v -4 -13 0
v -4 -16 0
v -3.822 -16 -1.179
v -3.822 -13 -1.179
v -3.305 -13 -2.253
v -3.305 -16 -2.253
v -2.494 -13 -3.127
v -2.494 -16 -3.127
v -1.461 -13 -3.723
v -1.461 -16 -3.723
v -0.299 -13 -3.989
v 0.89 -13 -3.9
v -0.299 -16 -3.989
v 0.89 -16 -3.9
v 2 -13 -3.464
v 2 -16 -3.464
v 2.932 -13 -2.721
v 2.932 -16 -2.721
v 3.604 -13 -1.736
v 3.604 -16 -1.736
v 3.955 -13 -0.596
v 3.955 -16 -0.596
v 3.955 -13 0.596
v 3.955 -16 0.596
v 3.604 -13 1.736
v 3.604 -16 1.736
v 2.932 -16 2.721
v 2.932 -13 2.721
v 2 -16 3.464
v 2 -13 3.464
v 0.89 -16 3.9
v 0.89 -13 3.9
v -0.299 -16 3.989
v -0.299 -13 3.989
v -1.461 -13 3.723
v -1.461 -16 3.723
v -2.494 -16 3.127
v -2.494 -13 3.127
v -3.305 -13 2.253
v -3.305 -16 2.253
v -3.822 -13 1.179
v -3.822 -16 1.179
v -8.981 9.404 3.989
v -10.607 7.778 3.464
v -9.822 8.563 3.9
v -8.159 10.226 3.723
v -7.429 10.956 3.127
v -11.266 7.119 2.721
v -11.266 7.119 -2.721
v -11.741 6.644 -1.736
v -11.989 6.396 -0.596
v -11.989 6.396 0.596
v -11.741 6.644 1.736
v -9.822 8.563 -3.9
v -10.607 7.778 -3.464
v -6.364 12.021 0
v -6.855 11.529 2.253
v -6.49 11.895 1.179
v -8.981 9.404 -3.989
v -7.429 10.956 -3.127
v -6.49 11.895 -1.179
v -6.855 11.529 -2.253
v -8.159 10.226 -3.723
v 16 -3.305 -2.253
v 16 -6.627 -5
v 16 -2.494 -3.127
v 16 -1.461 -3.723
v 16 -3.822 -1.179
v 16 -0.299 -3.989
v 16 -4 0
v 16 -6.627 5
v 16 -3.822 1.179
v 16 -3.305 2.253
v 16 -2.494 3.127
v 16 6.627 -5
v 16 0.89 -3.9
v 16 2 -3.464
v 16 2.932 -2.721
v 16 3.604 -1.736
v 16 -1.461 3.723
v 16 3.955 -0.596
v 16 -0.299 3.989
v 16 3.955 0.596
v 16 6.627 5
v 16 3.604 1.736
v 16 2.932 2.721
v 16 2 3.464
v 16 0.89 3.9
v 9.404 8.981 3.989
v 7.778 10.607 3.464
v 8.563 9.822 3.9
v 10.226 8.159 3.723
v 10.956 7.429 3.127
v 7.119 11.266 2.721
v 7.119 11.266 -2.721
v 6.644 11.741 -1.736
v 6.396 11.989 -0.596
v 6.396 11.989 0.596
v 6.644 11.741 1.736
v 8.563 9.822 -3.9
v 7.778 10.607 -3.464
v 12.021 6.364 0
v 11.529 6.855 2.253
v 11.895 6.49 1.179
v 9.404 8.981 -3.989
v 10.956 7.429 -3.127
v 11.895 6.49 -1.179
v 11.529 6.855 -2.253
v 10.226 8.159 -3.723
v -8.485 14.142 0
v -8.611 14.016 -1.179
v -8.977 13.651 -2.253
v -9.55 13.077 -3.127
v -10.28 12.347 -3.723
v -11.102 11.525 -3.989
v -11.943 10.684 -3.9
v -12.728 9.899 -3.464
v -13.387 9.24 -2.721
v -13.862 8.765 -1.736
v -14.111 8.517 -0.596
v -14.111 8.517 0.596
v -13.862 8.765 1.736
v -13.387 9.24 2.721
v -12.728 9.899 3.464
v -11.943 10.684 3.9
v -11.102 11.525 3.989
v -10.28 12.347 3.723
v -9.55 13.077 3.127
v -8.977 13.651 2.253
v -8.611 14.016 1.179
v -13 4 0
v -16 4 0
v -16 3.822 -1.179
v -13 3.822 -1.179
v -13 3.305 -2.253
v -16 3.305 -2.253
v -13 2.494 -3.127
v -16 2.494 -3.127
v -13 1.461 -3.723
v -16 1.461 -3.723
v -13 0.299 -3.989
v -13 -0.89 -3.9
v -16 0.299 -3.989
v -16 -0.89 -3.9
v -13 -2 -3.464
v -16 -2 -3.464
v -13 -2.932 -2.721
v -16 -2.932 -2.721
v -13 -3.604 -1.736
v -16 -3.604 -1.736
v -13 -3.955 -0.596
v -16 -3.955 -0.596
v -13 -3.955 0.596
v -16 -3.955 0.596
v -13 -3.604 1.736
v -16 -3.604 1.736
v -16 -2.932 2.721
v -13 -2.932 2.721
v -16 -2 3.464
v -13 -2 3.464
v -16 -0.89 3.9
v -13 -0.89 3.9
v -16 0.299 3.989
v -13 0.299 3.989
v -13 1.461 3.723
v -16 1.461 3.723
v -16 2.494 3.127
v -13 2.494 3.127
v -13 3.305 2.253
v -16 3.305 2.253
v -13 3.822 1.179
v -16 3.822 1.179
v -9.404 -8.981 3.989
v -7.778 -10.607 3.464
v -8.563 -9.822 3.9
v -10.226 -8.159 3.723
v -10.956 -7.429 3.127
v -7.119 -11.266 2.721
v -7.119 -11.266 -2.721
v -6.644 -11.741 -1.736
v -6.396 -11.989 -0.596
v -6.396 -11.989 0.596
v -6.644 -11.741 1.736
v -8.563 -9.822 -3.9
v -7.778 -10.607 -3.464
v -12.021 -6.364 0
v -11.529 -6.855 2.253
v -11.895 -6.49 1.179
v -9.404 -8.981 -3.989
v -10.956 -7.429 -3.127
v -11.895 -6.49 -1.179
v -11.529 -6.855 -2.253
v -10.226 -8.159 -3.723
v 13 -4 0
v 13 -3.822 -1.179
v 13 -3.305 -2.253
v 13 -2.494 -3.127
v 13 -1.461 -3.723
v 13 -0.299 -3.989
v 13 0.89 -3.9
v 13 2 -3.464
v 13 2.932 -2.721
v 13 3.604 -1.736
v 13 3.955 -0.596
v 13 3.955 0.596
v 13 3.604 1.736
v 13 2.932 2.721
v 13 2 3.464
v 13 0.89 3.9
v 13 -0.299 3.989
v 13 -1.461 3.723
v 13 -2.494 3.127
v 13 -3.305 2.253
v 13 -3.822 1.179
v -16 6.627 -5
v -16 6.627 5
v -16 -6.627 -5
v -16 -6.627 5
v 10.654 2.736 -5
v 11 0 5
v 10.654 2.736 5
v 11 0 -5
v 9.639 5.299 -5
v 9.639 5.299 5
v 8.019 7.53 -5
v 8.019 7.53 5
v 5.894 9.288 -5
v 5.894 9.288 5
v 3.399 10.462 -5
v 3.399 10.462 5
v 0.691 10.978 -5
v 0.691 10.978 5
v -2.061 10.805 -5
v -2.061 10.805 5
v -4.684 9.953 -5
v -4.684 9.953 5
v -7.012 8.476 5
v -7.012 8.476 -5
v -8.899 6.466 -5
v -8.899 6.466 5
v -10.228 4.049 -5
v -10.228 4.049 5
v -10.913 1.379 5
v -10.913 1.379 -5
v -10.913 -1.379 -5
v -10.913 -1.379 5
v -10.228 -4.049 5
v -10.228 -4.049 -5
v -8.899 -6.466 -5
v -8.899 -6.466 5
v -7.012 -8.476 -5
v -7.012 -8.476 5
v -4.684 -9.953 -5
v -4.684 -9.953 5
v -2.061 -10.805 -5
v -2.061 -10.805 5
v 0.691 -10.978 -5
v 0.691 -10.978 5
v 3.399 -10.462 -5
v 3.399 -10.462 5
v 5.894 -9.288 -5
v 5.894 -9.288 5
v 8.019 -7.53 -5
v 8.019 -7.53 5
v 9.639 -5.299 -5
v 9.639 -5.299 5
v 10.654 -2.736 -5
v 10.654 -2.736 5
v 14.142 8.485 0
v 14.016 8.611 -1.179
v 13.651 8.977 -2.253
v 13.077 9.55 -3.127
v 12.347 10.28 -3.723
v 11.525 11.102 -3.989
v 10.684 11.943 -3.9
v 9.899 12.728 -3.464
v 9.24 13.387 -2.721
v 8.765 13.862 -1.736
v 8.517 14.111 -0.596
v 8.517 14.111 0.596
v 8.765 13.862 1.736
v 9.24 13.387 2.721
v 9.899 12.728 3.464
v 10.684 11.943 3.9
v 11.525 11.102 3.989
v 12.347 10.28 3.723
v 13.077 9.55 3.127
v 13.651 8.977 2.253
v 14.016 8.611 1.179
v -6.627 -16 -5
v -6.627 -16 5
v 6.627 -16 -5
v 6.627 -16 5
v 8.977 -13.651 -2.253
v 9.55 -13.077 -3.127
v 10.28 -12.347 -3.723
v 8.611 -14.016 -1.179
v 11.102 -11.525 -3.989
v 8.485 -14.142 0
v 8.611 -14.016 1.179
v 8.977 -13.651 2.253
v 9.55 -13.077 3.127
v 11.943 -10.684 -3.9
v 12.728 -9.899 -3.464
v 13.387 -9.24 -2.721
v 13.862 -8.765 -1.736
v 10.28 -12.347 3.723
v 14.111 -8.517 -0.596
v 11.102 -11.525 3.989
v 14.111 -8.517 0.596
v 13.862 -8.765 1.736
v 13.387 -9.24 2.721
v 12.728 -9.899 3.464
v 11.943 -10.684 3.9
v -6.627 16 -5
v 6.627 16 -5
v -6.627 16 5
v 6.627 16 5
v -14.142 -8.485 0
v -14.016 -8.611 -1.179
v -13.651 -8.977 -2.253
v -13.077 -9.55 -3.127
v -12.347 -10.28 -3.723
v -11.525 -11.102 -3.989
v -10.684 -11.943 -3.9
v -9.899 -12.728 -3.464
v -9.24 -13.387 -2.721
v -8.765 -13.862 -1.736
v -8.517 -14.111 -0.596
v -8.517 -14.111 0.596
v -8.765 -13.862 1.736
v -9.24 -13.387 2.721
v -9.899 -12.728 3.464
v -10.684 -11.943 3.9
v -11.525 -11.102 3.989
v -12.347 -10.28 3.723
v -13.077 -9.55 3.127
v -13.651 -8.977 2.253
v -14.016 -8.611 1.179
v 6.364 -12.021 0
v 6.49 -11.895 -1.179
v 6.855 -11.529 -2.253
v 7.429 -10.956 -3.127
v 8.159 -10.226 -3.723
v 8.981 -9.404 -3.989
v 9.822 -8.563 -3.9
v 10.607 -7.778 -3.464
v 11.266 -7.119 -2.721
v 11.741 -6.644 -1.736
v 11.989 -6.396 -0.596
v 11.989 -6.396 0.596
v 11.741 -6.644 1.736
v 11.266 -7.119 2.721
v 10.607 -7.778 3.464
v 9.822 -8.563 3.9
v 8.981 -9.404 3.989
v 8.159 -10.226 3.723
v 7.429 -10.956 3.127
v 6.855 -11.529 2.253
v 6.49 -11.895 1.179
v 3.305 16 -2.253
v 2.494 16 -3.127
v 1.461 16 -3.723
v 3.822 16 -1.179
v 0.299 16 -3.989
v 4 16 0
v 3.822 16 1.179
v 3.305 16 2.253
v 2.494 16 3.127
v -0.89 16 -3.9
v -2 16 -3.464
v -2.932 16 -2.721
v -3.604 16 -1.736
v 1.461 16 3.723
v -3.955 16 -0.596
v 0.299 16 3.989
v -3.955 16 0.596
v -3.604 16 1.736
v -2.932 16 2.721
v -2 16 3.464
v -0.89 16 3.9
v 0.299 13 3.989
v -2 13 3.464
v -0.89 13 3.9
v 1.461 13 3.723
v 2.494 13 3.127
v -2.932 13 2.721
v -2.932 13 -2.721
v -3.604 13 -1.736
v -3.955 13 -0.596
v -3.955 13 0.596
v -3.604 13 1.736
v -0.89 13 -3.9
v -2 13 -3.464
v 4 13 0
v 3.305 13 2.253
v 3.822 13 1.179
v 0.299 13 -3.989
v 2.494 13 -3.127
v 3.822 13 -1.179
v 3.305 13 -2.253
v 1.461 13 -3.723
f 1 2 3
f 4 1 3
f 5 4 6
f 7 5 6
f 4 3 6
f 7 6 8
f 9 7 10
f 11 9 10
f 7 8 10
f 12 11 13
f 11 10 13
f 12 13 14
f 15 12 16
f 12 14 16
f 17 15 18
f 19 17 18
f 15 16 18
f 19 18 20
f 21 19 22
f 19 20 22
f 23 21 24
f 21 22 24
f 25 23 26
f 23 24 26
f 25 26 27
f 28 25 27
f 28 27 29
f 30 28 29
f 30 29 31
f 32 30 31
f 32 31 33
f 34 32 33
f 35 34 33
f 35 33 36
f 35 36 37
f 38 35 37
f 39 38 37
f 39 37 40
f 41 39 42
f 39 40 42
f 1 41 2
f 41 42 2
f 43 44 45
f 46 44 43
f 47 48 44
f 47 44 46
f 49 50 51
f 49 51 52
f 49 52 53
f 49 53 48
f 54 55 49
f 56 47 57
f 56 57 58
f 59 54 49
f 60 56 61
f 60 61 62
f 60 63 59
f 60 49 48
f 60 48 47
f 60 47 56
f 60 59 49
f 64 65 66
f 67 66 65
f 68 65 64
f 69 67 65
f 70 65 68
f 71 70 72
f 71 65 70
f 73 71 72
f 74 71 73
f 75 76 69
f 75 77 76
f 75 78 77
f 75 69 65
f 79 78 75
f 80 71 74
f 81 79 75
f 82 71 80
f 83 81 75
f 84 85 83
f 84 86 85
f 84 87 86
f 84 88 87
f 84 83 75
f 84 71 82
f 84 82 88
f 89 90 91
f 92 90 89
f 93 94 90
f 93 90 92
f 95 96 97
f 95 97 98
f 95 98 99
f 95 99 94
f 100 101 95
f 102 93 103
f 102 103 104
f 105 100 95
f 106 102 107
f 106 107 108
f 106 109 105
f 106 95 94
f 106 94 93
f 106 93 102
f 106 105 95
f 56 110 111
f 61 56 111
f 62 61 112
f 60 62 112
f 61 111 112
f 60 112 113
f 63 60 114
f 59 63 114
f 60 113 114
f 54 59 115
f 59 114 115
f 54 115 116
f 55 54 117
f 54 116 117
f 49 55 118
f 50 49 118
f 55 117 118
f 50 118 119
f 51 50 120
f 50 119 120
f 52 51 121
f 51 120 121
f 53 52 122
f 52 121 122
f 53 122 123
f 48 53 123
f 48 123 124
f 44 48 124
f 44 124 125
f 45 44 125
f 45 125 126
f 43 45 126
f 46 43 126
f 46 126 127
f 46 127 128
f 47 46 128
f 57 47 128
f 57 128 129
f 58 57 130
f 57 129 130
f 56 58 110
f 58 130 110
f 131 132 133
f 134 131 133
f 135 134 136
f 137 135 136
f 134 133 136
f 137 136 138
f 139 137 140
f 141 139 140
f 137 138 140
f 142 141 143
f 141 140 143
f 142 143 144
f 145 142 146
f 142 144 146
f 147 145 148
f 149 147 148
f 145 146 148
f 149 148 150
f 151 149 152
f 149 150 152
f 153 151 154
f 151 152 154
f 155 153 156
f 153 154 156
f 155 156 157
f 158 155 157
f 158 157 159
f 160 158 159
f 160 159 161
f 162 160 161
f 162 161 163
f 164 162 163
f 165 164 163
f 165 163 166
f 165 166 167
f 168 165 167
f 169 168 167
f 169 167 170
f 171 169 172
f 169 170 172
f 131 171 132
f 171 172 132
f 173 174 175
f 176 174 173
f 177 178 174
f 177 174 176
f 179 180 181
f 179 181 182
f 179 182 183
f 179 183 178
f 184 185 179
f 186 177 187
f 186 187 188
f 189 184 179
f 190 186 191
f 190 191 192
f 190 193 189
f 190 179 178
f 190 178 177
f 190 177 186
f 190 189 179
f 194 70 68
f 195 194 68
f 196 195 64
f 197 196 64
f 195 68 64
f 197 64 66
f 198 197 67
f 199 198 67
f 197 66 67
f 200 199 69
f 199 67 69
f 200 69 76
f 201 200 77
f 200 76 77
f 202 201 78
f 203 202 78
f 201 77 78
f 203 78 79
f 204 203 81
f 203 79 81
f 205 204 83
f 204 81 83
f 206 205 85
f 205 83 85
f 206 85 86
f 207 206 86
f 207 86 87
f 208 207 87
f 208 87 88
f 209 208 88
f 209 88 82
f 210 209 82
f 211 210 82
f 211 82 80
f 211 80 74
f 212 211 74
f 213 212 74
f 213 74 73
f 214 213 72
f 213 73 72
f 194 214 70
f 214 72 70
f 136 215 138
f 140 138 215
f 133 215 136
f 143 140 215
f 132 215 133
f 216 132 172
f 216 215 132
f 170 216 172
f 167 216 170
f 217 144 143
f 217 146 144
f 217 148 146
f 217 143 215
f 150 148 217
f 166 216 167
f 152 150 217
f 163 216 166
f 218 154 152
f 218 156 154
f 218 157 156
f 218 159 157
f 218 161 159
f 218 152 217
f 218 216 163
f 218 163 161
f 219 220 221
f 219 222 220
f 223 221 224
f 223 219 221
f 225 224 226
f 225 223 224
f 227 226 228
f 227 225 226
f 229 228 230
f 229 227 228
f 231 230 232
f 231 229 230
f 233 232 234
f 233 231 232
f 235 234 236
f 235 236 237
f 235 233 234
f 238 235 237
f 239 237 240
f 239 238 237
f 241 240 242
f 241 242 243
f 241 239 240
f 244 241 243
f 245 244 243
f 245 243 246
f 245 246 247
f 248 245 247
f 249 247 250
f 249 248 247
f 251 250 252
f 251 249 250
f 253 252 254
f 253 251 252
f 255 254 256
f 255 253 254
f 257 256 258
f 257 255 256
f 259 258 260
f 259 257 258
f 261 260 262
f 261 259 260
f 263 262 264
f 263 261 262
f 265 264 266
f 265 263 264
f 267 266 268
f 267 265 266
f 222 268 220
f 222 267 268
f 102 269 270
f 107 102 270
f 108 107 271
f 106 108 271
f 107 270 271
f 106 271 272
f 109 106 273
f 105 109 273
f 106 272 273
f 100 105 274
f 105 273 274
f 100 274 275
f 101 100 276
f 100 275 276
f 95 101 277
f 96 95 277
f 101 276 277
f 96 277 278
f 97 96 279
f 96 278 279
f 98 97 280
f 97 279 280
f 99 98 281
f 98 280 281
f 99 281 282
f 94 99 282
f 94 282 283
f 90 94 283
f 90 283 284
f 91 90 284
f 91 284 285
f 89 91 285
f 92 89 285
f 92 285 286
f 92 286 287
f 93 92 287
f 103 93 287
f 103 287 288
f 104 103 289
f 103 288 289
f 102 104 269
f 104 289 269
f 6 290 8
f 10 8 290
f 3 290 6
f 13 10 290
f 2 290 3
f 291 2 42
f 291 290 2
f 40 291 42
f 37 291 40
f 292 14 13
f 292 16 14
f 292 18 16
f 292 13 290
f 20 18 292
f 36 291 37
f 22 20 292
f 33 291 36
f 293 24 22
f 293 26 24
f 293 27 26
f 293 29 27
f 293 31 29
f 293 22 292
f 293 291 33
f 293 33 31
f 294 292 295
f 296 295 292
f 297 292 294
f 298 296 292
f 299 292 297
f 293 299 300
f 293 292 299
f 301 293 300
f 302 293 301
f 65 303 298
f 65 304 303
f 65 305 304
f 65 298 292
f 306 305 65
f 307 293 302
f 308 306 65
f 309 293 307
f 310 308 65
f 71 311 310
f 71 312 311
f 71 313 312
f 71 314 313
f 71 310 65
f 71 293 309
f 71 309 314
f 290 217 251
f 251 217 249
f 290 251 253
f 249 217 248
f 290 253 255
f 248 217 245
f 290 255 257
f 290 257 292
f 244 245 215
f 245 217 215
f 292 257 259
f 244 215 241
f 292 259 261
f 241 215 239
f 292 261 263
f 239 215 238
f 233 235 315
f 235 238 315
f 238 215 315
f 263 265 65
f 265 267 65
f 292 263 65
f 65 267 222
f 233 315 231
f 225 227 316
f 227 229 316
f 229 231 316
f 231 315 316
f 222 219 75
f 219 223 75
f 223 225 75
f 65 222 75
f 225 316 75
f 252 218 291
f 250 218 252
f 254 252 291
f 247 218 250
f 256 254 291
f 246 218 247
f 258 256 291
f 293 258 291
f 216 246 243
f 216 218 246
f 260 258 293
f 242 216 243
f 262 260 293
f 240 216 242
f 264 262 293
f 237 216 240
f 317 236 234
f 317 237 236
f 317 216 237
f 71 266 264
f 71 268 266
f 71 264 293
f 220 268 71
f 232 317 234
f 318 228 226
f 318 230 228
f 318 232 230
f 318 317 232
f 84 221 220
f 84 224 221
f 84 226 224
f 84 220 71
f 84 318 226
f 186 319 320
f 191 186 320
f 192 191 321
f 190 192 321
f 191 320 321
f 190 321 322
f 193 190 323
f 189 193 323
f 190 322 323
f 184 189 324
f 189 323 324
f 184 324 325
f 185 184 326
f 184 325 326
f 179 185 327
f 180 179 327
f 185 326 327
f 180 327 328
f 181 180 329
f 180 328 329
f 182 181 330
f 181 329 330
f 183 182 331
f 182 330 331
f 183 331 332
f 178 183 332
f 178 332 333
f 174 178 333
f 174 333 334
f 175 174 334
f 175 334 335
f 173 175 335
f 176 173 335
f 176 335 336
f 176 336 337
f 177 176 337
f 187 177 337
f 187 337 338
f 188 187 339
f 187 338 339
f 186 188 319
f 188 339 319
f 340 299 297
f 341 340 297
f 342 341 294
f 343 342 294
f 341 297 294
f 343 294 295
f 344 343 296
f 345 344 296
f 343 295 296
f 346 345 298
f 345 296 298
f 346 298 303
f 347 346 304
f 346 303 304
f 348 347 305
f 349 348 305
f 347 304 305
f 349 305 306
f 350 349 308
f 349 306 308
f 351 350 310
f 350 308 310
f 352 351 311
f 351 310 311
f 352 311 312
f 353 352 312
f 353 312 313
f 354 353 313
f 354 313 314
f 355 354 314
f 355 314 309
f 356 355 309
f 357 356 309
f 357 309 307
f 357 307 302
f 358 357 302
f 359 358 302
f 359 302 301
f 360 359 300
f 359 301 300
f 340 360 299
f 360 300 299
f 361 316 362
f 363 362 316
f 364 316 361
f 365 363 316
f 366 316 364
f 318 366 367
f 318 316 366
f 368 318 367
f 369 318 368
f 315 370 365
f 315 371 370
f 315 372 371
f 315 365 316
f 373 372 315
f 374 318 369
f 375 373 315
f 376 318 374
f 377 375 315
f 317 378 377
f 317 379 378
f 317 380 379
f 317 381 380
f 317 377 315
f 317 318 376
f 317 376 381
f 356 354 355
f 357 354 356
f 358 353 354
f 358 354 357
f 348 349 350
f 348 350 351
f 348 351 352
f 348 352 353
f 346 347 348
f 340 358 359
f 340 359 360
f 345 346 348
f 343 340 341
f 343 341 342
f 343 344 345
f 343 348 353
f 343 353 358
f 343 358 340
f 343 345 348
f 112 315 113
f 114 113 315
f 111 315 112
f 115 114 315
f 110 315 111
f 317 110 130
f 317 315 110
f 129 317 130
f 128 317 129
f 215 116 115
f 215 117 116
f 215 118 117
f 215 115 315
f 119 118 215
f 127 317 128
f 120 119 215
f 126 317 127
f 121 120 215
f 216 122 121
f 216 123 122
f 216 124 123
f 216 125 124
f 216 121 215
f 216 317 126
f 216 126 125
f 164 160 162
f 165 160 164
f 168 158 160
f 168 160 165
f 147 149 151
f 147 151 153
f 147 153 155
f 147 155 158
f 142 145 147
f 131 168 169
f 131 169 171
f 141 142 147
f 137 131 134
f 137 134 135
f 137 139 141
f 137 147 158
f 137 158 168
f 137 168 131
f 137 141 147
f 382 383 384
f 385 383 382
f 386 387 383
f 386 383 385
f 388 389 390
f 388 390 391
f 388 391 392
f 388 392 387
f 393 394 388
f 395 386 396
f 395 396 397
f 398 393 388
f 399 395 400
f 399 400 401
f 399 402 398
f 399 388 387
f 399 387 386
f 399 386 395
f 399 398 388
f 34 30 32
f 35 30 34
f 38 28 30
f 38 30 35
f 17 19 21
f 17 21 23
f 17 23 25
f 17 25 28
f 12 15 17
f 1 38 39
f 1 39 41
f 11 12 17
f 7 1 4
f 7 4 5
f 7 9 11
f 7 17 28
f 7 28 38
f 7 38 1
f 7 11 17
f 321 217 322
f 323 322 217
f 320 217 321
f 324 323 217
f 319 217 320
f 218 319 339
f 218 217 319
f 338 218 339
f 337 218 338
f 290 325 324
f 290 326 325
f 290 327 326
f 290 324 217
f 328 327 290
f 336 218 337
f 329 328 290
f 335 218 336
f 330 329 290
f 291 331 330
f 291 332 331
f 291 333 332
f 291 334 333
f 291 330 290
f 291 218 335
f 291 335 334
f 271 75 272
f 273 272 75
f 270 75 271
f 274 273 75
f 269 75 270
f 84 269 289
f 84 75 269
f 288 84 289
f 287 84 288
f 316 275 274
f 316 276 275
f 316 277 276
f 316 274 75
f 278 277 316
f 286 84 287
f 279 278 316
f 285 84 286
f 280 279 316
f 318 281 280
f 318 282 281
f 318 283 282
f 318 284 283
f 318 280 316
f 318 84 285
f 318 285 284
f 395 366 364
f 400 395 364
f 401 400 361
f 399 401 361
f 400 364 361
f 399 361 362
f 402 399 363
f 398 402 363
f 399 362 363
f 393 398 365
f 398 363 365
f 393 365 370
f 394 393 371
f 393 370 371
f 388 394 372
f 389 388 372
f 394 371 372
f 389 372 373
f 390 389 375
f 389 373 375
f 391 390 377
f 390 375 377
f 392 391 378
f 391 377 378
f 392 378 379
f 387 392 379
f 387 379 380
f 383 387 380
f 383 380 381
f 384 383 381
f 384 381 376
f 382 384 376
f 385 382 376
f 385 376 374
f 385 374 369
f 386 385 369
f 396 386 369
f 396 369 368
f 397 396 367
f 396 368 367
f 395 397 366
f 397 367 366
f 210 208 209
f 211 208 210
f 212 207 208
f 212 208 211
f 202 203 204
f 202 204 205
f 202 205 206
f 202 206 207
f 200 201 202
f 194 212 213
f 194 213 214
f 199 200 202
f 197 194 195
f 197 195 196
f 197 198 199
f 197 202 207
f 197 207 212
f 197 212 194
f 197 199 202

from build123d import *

# Parameters (mm, degrees)
SKETCH1_R           = 11
BOSS_EXTRUDE1_DEPTH = 5
SKETCH2_R           = 4
CUT_EXTRUDE3_DEPTH  = 3
CIRPATTERN1_COUNT   = 8


with BuildPart() as part:
    # Sketch1 → Boss-Extrude1 (new, symmetric)
    with BuildSketch(Plane.XY):
        Polygon((6.627416998, 16), (-6.627416998, 16), (-16, 6.627416998), (-16, -6.627416998), (-6.627416998, -16), (6.627416998, -16), (16, -6.627416998), (16, 6.627416998), align=None)
        Circle(SKETCH1_R, mode=Mode.SUBTRACT)
    extrude(amount=BOSS_EXTRUDE1_DEPTH, both=True)

    # Sketch2 → Cut-Extrude3 (cut)
    with BuildSketch(Plane(origin=(0, -16, 0), x_dir=(-1, 0, 0), z_dir=(0, -1, 0))):
        Circle(SKETCH2_R)
    cut_extrude3 = extrude(amount=-CUT_EXTRUDE3_DEPTH, mode=Mode.SUBTRACT)

    # CirPattern1: Cut-Extrude3 ×8 about axis
    cirpattern1_axis = Axis((0, 0, 5), (0, 0, 1))
    for i in range(1, CIRPATTERN1_COUNT):
        add(cut_extrude3.rotate(cirpattern1_axis, i * 360 / CIRPATTERN1_COUNT), mode=Mode.SUBTRACT)


solid = part.part
